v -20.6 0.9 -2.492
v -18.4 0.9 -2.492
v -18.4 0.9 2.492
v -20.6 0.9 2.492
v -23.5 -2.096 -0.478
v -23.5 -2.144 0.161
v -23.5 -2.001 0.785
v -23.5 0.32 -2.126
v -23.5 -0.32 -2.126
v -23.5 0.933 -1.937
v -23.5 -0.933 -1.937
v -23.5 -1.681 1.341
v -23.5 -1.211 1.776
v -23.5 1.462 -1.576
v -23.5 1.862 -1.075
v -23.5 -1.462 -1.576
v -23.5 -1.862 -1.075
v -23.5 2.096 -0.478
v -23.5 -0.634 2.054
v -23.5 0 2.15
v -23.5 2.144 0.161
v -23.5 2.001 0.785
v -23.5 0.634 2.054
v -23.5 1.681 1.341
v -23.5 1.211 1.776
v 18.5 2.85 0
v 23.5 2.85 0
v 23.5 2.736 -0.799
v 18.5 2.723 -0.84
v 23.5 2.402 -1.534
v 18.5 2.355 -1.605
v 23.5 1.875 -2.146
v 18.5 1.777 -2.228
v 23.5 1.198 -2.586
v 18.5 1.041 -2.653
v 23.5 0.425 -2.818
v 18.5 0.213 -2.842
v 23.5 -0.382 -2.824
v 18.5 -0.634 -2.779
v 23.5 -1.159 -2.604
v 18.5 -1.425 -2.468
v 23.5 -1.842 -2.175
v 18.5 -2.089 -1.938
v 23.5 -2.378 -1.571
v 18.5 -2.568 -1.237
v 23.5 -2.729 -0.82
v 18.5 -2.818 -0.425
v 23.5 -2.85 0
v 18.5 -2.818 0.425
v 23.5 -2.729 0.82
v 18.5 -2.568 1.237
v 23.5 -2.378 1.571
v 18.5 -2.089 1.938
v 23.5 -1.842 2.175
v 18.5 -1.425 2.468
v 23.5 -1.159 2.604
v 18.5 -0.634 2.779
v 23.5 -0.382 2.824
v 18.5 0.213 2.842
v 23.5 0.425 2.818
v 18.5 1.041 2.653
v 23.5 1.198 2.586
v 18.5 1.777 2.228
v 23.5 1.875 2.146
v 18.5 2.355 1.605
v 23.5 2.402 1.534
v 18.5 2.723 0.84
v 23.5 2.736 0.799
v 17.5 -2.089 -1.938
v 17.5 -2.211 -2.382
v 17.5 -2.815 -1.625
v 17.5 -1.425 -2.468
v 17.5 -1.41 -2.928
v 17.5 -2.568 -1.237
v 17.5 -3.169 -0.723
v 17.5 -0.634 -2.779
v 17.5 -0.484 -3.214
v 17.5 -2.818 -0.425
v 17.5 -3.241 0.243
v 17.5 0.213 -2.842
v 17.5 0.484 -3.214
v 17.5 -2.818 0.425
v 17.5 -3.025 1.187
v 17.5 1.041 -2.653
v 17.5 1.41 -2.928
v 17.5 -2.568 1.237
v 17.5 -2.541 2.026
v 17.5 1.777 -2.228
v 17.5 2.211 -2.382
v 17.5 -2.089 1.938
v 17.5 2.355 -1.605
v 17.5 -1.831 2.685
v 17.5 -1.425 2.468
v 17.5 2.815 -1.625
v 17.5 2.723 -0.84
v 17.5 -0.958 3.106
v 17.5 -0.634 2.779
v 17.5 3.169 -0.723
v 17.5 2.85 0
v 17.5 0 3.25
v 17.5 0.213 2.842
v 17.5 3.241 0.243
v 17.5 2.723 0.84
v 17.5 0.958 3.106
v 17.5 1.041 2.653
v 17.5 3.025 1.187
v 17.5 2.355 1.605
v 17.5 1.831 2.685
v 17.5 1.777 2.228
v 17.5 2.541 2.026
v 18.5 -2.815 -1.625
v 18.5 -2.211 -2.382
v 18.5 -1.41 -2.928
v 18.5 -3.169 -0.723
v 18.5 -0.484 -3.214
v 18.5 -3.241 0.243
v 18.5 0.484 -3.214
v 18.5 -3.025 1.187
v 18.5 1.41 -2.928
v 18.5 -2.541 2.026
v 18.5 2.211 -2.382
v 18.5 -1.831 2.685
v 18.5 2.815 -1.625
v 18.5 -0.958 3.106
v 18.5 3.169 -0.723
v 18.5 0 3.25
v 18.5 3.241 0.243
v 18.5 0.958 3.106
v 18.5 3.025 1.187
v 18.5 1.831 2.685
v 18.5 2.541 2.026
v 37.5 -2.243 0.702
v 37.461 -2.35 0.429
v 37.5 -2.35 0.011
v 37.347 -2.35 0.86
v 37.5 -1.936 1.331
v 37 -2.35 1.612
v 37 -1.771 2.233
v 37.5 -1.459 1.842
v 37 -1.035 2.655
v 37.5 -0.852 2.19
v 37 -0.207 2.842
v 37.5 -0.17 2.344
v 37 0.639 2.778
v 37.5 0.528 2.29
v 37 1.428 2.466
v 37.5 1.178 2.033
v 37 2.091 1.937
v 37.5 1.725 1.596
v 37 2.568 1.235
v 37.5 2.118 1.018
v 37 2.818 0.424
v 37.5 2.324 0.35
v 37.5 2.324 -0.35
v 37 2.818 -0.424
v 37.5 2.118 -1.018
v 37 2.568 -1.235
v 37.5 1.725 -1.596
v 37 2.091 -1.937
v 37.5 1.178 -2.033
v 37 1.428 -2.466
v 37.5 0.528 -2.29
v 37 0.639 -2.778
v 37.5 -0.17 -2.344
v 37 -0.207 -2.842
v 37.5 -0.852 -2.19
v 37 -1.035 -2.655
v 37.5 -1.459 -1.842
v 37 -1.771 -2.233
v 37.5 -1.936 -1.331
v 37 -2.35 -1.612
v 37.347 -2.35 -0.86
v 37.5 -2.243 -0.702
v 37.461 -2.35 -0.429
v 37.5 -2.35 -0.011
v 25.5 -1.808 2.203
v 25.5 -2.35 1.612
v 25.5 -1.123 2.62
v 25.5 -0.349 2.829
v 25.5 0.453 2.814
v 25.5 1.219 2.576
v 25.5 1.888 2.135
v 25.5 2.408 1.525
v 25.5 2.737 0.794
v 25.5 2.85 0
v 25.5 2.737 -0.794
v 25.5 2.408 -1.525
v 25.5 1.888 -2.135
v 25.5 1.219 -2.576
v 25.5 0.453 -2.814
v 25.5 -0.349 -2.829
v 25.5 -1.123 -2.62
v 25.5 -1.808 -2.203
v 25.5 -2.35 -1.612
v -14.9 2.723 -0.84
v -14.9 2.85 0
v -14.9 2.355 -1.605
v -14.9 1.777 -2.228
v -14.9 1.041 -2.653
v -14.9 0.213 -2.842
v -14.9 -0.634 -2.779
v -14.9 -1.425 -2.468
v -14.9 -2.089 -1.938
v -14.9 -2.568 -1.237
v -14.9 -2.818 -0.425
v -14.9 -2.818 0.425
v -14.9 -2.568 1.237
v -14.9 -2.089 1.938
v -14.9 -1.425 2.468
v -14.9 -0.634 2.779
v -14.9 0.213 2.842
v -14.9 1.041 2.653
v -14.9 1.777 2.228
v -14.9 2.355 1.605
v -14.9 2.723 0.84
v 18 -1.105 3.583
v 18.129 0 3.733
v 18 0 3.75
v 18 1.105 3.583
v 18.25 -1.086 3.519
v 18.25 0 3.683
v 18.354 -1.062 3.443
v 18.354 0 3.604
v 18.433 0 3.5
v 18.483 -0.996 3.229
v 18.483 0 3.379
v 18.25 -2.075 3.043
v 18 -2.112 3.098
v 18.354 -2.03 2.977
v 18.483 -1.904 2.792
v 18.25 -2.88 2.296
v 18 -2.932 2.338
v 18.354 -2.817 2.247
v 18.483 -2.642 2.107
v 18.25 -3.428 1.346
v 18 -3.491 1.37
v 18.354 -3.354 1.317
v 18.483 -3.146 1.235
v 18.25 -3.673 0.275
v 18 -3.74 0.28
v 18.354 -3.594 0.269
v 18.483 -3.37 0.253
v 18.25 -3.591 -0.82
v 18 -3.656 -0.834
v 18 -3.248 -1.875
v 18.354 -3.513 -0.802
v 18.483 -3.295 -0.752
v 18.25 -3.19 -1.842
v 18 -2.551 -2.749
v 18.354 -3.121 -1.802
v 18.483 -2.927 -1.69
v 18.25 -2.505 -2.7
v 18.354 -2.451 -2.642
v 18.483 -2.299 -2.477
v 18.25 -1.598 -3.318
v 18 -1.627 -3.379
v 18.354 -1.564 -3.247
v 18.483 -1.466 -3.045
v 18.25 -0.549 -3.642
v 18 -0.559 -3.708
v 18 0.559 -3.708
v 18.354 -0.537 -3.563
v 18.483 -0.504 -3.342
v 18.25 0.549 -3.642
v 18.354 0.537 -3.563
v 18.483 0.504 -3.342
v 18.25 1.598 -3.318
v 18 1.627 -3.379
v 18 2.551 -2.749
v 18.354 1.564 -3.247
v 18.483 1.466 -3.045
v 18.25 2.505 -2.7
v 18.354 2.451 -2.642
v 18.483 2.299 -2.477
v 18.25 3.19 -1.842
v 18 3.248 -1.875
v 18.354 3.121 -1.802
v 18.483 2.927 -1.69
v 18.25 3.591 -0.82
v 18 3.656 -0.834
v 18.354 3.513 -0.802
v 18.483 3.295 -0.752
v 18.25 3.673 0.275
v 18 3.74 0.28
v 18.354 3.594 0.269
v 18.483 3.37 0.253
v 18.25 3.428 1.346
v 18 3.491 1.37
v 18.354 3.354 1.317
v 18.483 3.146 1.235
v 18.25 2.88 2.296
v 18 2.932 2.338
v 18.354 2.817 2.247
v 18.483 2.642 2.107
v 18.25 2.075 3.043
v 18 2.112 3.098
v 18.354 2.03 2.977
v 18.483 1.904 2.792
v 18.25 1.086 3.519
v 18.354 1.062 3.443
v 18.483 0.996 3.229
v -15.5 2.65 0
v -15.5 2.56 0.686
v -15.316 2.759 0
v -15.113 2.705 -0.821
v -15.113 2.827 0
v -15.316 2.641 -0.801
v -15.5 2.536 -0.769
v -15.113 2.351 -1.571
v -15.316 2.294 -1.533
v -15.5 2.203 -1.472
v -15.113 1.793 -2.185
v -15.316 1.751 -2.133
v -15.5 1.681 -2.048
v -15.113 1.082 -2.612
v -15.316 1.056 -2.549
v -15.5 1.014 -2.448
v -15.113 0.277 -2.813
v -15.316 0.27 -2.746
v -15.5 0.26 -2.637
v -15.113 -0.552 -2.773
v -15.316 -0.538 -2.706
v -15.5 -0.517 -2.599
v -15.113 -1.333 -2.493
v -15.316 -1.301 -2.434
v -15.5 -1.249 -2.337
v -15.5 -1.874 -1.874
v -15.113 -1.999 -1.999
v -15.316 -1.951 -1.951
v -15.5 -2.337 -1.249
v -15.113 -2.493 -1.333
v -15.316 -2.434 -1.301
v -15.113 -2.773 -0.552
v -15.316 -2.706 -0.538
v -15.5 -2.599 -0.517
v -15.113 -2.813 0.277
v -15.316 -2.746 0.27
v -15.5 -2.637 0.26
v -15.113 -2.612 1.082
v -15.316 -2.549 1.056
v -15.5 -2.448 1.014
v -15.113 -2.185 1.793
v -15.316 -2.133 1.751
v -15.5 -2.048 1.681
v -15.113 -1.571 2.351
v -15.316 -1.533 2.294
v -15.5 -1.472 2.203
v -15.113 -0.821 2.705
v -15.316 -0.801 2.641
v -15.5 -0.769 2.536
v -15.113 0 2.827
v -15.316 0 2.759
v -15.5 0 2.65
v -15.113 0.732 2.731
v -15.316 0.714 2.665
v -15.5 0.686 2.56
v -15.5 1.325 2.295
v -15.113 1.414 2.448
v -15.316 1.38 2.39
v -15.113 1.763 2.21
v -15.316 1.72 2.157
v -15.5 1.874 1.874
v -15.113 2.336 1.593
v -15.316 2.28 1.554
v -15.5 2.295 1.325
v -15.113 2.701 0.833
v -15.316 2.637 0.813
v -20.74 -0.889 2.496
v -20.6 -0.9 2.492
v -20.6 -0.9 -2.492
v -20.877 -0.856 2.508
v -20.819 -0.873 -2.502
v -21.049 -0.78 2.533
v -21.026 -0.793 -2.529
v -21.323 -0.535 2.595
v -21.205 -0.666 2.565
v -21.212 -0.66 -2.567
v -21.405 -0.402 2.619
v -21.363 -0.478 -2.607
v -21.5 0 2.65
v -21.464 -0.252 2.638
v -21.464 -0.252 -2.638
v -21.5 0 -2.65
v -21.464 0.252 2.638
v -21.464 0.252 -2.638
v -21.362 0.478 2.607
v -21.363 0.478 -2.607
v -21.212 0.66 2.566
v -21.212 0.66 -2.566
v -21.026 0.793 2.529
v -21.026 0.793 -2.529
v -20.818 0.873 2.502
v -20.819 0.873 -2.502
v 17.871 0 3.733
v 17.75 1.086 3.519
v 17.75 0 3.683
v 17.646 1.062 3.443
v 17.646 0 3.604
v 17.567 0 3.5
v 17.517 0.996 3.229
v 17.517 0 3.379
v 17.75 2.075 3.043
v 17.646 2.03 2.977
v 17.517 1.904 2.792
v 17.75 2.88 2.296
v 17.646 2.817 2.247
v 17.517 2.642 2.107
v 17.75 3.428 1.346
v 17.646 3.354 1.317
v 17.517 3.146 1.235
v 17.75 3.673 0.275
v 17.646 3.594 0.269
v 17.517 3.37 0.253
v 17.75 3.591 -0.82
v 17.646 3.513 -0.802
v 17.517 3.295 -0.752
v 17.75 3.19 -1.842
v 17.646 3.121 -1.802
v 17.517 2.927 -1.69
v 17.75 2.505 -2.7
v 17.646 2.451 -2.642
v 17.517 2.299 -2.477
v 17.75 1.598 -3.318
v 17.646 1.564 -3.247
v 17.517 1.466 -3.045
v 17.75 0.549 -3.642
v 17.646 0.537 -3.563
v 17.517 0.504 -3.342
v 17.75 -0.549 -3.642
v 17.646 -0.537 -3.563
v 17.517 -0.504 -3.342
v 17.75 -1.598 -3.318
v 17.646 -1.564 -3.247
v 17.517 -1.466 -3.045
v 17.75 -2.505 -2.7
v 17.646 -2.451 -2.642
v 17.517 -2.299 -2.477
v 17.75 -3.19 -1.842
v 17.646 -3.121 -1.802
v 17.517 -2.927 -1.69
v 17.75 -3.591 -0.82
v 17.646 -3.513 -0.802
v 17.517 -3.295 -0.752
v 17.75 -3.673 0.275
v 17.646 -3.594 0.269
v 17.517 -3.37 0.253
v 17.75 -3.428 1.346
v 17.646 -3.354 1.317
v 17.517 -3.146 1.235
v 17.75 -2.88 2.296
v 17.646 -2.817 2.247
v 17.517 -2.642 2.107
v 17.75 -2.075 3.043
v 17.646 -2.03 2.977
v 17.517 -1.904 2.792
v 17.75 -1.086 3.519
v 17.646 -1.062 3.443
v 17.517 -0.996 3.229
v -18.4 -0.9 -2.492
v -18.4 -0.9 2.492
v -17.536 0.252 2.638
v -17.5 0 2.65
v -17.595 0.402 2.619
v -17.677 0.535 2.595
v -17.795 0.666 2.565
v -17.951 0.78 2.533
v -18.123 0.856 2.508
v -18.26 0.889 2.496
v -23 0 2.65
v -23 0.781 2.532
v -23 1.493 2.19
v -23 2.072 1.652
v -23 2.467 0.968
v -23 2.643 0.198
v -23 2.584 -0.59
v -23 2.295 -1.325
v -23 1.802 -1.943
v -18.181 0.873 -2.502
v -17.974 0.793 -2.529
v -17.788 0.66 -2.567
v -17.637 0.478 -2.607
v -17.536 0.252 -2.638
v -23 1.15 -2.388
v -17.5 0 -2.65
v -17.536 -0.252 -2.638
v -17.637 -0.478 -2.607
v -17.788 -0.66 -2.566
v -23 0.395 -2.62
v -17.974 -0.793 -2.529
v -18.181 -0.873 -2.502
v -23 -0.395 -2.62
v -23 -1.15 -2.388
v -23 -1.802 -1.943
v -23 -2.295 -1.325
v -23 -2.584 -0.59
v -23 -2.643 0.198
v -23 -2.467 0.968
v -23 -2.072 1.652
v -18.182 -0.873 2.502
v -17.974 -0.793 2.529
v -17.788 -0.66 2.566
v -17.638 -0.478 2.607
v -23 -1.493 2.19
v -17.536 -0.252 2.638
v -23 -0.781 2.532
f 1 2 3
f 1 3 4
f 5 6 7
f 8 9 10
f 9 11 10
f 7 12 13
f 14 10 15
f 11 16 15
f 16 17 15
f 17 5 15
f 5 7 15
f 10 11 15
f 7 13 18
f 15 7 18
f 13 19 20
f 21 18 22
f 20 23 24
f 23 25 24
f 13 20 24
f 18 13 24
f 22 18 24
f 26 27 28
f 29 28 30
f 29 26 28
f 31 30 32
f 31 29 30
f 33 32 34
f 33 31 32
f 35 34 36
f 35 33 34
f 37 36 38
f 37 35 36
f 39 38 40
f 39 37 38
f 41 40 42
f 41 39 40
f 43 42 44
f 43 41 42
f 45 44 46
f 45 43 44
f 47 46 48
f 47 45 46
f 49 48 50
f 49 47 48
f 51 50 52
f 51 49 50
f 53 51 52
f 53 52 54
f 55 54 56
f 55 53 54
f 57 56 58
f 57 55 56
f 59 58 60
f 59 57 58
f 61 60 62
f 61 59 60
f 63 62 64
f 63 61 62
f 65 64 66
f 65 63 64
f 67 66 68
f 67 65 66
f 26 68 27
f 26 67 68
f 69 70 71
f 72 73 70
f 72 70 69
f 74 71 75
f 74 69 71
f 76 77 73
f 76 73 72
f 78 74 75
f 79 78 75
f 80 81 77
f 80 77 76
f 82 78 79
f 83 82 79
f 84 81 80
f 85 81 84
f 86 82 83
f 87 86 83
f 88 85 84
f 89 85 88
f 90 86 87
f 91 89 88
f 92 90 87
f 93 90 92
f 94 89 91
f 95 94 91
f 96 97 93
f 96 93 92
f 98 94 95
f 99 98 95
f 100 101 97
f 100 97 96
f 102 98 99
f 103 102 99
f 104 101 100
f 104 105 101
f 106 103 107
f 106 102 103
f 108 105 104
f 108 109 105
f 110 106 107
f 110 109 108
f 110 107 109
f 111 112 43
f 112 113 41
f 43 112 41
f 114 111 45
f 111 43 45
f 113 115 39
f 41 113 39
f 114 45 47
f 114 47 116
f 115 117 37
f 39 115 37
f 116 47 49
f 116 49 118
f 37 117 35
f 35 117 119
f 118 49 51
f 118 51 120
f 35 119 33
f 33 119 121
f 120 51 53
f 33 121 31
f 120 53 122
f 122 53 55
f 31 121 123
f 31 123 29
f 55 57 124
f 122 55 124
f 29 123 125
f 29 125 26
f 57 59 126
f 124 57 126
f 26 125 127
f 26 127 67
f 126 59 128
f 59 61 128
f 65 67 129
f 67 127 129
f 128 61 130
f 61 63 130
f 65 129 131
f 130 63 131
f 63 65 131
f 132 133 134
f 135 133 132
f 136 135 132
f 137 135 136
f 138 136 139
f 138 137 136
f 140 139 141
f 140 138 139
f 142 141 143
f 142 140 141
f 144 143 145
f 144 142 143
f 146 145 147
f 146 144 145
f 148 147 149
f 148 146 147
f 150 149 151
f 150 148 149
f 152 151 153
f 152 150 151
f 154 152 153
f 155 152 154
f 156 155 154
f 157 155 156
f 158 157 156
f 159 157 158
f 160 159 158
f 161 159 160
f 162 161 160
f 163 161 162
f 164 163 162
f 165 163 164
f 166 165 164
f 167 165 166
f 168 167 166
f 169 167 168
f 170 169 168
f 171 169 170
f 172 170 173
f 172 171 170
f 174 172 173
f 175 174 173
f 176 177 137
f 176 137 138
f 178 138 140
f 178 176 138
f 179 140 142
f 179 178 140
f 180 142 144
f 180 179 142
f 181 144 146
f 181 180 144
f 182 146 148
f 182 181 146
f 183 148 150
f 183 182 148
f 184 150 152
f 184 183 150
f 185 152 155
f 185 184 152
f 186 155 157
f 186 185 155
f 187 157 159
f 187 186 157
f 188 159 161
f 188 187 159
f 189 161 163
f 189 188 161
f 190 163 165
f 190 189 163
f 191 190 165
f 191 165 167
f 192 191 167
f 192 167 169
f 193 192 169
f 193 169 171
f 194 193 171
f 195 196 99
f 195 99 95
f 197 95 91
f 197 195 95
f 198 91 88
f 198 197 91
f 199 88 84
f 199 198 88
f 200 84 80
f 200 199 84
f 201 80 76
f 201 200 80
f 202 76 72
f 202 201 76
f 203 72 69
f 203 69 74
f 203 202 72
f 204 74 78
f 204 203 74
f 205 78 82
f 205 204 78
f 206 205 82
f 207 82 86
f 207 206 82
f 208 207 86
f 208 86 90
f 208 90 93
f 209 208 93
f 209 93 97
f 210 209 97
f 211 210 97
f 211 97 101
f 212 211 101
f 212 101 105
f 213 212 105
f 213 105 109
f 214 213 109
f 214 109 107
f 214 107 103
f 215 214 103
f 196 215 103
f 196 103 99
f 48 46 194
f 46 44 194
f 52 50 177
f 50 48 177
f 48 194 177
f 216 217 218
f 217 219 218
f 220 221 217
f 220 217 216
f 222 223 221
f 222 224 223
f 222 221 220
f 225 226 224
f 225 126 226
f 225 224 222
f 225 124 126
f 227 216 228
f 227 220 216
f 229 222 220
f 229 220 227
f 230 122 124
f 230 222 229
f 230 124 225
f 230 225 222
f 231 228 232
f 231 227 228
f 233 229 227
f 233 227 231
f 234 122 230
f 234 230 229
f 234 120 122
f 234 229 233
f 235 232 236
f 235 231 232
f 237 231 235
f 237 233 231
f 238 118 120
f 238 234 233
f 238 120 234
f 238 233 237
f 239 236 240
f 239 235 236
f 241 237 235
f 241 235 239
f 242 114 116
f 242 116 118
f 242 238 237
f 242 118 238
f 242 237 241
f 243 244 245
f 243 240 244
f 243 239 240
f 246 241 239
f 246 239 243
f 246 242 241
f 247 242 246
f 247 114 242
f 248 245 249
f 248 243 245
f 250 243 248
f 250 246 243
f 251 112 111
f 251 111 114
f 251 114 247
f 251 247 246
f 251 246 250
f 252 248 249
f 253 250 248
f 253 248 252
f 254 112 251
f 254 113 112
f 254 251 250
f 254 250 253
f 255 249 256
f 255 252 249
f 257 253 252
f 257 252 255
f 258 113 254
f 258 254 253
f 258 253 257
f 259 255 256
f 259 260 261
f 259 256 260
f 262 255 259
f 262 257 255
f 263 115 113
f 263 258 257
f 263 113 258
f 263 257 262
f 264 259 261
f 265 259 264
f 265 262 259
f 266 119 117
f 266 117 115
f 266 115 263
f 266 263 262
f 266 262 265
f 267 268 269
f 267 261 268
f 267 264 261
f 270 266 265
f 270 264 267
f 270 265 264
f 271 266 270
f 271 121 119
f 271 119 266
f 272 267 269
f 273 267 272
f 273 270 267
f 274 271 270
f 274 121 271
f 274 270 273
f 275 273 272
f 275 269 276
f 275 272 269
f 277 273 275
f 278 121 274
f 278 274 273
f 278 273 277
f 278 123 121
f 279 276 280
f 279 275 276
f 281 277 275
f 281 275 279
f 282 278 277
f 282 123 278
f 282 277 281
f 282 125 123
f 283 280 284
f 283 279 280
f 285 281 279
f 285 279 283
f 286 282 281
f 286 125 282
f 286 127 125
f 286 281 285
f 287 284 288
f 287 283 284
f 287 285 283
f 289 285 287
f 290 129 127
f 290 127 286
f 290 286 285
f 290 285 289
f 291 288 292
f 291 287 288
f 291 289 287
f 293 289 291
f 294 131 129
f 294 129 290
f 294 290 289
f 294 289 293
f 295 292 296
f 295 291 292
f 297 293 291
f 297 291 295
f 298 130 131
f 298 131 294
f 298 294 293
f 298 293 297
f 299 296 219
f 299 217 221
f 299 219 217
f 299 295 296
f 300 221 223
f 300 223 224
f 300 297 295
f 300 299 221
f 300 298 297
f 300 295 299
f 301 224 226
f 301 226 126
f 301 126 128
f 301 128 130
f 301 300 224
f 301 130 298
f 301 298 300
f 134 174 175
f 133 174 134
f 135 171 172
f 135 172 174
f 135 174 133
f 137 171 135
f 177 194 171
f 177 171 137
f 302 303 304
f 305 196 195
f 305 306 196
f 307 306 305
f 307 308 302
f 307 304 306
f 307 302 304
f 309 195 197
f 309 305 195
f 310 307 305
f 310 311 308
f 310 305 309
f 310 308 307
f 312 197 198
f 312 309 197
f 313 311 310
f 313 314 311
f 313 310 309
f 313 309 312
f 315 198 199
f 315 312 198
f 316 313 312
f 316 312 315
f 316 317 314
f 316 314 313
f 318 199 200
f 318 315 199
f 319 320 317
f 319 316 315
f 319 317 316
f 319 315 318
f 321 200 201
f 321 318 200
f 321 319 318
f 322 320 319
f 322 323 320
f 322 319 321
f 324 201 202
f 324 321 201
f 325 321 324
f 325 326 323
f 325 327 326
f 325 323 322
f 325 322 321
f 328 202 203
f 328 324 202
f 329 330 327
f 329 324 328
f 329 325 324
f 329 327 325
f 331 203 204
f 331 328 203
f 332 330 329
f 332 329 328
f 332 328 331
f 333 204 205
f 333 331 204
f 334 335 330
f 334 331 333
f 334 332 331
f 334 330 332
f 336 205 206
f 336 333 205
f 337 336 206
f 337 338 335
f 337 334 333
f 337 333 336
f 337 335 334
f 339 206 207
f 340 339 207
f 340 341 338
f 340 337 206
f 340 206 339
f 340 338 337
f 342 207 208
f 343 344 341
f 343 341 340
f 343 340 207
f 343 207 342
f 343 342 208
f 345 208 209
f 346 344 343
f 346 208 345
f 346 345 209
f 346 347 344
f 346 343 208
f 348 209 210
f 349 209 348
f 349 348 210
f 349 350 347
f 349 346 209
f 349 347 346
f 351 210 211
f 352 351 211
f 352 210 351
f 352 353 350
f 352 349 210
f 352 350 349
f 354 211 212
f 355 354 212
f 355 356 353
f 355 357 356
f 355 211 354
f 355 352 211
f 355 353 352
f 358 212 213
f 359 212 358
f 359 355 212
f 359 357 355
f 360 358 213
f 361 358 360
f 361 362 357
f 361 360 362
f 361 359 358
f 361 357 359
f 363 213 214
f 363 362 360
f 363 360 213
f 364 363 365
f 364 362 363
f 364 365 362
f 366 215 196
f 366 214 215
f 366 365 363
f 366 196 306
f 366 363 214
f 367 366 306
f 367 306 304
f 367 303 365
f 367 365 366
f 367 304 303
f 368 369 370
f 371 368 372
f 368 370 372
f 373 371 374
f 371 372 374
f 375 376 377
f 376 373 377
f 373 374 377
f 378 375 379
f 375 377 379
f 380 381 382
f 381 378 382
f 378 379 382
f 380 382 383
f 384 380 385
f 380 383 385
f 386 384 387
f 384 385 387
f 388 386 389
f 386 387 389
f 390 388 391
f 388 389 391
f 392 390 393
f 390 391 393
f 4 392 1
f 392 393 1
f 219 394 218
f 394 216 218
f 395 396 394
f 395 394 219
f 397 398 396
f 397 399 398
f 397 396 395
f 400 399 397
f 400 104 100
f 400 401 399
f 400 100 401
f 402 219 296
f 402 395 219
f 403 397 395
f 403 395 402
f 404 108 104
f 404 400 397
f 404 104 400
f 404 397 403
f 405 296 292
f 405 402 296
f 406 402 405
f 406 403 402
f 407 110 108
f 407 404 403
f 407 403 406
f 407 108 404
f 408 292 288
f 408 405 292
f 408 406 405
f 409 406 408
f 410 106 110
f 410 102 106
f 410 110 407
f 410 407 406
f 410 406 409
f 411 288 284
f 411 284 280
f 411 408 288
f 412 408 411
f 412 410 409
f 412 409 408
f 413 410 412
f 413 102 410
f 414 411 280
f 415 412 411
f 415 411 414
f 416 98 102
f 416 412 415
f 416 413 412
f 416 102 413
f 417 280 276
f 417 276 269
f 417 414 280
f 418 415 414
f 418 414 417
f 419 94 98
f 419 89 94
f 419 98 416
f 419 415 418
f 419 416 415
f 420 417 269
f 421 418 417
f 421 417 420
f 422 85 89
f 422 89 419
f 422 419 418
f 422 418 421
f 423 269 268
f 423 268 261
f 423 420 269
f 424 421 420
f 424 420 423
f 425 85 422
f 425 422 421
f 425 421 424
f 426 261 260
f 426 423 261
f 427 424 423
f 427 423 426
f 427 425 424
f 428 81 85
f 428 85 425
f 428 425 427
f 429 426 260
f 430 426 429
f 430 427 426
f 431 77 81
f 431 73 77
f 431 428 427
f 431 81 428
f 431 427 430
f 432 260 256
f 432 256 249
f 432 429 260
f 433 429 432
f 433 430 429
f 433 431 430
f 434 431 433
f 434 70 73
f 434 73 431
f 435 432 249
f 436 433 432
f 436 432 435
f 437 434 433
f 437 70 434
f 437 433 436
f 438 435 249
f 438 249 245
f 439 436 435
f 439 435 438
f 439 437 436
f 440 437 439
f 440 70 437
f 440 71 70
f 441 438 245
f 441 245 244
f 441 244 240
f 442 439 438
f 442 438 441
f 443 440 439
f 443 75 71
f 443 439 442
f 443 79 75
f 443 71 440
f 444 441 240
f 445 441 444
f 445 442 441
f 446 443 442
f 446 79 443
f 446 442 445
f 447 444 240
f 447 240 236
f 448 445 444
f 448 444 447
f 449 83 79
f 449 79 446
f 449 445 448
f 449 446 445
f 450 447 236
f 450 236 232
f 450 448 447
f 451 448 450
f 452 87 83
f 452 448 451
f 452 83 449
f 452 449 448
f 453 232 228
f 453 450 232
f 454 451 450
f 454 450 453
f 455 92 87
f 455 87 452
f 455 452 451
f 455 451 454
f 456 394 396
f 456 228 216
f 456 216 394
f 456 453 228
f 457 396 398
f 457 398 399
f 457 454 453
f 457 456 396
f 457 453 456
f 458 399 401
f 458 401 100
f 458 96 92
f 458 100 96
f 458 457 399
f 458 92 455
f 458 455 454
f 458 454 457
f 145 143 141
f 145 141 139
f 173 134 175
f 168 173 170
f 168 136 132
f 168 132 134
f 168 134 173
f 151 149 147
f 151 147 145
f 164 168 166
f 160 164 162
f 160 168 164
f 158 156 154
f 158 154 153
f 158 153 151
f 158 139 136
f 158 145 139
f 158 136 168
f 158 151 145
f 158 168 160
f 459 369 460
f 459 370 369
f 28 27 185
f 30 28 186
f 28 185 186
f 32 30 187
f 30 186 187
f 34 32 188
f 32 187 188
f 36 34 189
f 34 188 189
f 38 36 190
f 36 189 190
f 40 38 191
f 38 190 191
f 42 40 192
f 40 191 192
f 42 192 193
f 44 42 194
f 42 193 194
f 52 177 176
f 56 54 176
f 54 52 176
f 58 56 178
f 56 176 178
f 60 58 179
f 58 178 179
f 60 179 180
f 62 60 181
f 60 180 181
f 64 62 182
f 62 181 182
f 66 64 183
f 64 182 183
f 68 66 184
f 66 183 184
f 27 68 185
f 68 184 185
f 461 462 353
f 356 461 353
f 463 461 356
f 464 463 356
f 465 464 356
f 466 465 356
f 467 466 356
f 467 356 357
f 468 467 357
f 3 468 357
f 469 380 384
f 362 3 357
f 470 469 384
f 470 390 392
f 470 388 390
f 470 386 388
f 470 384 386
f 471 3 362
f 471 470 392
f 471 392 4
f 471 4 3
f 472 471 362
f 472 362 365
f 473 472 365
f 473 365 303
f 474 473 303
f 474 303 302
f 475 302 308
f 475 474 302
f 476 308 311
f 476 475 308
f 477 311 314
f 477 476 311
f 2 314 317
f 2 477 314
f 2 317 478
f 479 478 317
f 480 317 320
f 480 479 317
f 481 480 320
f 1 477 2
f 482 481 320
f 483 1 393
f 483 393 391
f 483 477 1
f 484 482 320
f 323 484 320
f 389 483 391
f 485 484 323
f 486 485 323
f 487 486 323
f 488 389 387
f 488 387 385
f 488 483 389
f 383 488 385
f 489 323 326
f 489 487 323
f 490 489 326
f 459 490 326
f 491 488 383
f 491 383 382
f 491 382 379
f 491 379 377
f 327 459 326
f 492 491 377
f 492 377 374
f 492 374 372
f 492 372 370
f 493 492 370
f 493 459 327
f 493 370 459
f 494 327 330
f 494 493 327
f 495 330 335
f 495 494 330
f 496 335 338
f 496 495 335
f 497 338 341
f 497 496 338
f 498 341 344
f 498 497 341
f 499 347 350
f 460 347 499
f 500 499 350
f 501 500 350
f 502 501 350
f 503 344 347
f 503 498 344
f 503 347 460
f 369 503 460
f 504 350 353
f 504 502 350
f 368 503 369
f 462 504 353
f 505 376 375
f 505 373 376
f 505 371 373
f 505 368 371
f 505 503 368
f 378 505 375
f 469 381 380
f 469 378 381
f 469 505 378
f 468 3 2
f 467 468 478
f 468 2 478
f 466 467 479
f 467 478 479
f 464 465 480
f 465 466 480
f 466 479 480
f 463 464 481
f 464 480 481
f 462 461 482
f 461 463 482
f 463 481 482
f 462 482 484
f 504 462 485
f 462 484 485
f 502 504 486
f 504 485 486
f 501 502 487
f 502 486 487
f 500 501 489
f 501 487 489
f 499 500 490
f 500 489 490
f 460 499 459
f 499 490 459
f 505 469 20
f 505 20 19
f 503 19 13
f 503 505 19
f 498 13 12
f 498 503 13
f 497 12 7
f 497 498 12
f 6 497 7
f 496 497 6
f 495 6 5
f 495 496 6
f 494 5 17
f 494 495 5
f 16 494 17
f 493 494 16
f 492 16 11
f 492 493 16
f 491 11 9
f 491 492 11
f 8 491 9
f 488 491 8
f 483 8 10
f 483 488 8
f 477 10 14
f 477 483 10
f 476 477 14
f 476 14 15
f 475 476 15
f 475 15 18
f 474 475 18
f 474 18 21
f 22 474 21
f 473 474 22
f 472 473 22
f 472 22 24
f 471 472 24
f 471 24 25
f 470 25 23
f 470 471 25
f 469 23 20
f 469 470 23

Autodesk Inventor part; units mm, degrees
ref_plane "YZ Plane" through (0, 0, 0) normal (1, 0, 0) x (0, 1, 0)
sketch "Sketch1" plane through (0, 0, 0) normal (1, 0, 0) x (0, 1, 0)
  circle A0 centre (0, 0) radius 2.85
  dimension "diameter" = 5.7
extrude "Shaft" add sketch "Sketch1" along normal mid plane 47
sketch "Sketch2" plane through (0, 0, 0) normal (0, 0, 1) x (1, 0, 0)
  line L0 (-23.5, -2.85) -> (-23.5, 2.85) construction
  line L1 (23.5, -2.85) -> (-23.5, -2.85) construction
  line L2 (23.5, 2.85) -> (23.5, -2.85) construction
  line L3 (-23.5, 2.85) -> (23.5, 2.85) construction
  line L4 (-23.5, -2.85) -> (23.5, -2.85) projected
  line L5 (-16.5, -2.85) -> (-16.5, -2.85)
  line L6 (-23.5, -2.85) -> (23.5, -2.85) projected
  line L7 (-21.5, 0) -> (-17.5, 0) construction
  line L8 (-20.6, -0.9) -> (-18.4, -0.9)
  line L9 (-18.4, 0.9) -> (-20.6, 0.9)
  arc A0 (-20.6, 0.9) -> (-20.6, -0.9) centre (-20.6, 0) ccw
  arc A1 (-18.4, -0.9) -> (-18.4, 0.9) centre (-18.4, 0) ccw
  point P0 (0, 0)
  point P1 (23.5, 0)
  point P2 (-19.5, 0)
  dimension "d17" = 1.8
  dimension "d20" = 2
  dimension "d21" = 1
  dimension "d22" = 7
extrude "Slot for Differential Gear" cut sketch "Sketch2" along normal through all both and the other way through all
ref_plane "Work Plane1" through (25.5, 0, 0) normal (1, 0, 0) x (0, 0, -1)
sketch "Sketch3" plane through (25.5, 0, 0) normal (1, 0, 0) x (0, 0, -1)
  arc A0 (1.6583, -2.5) -> (-1.6583, -2.5) centre (0, 0) ccw construction
  circle A1 centre (0, 0) radius 2.85 construction
  line L0 (-1.6583, -2.5) -> (1.6583, -2.5)
  arc A2 (1.6125, -2.35) -> (-1.6125, -2.35) centre (0, 0) ccw
  line L1 (1.6125, -2.35) -> (-1.6125, -2.35)
  point P0 (-1.3684, -2.5)
  point P1 (1.3684, -2.5)
  dimension "d49" = 3
  dimension "d50" = 2.5
  dimension "wheel_offset" = 0.15
extrude "Wheel Insert Profile" add sketch "Sketch3" along normal blind 12
loft "Loft1" add section 1 edges at (23.5, -2.85, 0) section 2 edges at (25.5, -2.35, 0) (25.5, 2.85, 0)
ref_plane "Work Plane2" through (17.5, 0, 0) normal (-1, 0, 0) x (0, 0, 1)
sketch "Sketch4" plane through (17.5, 0, 0) normal (-1, 0, 0) x (0, 0, 1)
  circle A0 centre (0, 0) radius 3.75
  dimension "d35" = 7.5
extrude "Stopper" add sketch "Sketch4" against normal blind 1
fillet "Fillet1" radius 0.5 2 edges at (17.5, 0, -3.75) (18.5, 0, -3.75)
sketch "Sketch8" plane through (-23.5, 0, 0) normal (-1, 0, 0) x (0, 0, 1)
  circle A0 centre (0, 0) radius 2.85 projected
  circle A1 centre (0, 0) radius 2.7 construction
  circle A2 centre (0, 0) radius 2.65
  dimension "d68" = 5.4
  dimension "d69" = 0.05
extrude "Differential Gear Insert Profile" cut sketch "Sketch8" against normal blind 8
fillet "Fillet3" radius 1 1 edges at (-15.5, -2.85, 0)
chamfer "Chamfer4" distance 0.5 angle 45 2 edges at (-23.5, 0, -2.65) (37.5, 2.85, 0)
properties part number "rear shaft v2"
